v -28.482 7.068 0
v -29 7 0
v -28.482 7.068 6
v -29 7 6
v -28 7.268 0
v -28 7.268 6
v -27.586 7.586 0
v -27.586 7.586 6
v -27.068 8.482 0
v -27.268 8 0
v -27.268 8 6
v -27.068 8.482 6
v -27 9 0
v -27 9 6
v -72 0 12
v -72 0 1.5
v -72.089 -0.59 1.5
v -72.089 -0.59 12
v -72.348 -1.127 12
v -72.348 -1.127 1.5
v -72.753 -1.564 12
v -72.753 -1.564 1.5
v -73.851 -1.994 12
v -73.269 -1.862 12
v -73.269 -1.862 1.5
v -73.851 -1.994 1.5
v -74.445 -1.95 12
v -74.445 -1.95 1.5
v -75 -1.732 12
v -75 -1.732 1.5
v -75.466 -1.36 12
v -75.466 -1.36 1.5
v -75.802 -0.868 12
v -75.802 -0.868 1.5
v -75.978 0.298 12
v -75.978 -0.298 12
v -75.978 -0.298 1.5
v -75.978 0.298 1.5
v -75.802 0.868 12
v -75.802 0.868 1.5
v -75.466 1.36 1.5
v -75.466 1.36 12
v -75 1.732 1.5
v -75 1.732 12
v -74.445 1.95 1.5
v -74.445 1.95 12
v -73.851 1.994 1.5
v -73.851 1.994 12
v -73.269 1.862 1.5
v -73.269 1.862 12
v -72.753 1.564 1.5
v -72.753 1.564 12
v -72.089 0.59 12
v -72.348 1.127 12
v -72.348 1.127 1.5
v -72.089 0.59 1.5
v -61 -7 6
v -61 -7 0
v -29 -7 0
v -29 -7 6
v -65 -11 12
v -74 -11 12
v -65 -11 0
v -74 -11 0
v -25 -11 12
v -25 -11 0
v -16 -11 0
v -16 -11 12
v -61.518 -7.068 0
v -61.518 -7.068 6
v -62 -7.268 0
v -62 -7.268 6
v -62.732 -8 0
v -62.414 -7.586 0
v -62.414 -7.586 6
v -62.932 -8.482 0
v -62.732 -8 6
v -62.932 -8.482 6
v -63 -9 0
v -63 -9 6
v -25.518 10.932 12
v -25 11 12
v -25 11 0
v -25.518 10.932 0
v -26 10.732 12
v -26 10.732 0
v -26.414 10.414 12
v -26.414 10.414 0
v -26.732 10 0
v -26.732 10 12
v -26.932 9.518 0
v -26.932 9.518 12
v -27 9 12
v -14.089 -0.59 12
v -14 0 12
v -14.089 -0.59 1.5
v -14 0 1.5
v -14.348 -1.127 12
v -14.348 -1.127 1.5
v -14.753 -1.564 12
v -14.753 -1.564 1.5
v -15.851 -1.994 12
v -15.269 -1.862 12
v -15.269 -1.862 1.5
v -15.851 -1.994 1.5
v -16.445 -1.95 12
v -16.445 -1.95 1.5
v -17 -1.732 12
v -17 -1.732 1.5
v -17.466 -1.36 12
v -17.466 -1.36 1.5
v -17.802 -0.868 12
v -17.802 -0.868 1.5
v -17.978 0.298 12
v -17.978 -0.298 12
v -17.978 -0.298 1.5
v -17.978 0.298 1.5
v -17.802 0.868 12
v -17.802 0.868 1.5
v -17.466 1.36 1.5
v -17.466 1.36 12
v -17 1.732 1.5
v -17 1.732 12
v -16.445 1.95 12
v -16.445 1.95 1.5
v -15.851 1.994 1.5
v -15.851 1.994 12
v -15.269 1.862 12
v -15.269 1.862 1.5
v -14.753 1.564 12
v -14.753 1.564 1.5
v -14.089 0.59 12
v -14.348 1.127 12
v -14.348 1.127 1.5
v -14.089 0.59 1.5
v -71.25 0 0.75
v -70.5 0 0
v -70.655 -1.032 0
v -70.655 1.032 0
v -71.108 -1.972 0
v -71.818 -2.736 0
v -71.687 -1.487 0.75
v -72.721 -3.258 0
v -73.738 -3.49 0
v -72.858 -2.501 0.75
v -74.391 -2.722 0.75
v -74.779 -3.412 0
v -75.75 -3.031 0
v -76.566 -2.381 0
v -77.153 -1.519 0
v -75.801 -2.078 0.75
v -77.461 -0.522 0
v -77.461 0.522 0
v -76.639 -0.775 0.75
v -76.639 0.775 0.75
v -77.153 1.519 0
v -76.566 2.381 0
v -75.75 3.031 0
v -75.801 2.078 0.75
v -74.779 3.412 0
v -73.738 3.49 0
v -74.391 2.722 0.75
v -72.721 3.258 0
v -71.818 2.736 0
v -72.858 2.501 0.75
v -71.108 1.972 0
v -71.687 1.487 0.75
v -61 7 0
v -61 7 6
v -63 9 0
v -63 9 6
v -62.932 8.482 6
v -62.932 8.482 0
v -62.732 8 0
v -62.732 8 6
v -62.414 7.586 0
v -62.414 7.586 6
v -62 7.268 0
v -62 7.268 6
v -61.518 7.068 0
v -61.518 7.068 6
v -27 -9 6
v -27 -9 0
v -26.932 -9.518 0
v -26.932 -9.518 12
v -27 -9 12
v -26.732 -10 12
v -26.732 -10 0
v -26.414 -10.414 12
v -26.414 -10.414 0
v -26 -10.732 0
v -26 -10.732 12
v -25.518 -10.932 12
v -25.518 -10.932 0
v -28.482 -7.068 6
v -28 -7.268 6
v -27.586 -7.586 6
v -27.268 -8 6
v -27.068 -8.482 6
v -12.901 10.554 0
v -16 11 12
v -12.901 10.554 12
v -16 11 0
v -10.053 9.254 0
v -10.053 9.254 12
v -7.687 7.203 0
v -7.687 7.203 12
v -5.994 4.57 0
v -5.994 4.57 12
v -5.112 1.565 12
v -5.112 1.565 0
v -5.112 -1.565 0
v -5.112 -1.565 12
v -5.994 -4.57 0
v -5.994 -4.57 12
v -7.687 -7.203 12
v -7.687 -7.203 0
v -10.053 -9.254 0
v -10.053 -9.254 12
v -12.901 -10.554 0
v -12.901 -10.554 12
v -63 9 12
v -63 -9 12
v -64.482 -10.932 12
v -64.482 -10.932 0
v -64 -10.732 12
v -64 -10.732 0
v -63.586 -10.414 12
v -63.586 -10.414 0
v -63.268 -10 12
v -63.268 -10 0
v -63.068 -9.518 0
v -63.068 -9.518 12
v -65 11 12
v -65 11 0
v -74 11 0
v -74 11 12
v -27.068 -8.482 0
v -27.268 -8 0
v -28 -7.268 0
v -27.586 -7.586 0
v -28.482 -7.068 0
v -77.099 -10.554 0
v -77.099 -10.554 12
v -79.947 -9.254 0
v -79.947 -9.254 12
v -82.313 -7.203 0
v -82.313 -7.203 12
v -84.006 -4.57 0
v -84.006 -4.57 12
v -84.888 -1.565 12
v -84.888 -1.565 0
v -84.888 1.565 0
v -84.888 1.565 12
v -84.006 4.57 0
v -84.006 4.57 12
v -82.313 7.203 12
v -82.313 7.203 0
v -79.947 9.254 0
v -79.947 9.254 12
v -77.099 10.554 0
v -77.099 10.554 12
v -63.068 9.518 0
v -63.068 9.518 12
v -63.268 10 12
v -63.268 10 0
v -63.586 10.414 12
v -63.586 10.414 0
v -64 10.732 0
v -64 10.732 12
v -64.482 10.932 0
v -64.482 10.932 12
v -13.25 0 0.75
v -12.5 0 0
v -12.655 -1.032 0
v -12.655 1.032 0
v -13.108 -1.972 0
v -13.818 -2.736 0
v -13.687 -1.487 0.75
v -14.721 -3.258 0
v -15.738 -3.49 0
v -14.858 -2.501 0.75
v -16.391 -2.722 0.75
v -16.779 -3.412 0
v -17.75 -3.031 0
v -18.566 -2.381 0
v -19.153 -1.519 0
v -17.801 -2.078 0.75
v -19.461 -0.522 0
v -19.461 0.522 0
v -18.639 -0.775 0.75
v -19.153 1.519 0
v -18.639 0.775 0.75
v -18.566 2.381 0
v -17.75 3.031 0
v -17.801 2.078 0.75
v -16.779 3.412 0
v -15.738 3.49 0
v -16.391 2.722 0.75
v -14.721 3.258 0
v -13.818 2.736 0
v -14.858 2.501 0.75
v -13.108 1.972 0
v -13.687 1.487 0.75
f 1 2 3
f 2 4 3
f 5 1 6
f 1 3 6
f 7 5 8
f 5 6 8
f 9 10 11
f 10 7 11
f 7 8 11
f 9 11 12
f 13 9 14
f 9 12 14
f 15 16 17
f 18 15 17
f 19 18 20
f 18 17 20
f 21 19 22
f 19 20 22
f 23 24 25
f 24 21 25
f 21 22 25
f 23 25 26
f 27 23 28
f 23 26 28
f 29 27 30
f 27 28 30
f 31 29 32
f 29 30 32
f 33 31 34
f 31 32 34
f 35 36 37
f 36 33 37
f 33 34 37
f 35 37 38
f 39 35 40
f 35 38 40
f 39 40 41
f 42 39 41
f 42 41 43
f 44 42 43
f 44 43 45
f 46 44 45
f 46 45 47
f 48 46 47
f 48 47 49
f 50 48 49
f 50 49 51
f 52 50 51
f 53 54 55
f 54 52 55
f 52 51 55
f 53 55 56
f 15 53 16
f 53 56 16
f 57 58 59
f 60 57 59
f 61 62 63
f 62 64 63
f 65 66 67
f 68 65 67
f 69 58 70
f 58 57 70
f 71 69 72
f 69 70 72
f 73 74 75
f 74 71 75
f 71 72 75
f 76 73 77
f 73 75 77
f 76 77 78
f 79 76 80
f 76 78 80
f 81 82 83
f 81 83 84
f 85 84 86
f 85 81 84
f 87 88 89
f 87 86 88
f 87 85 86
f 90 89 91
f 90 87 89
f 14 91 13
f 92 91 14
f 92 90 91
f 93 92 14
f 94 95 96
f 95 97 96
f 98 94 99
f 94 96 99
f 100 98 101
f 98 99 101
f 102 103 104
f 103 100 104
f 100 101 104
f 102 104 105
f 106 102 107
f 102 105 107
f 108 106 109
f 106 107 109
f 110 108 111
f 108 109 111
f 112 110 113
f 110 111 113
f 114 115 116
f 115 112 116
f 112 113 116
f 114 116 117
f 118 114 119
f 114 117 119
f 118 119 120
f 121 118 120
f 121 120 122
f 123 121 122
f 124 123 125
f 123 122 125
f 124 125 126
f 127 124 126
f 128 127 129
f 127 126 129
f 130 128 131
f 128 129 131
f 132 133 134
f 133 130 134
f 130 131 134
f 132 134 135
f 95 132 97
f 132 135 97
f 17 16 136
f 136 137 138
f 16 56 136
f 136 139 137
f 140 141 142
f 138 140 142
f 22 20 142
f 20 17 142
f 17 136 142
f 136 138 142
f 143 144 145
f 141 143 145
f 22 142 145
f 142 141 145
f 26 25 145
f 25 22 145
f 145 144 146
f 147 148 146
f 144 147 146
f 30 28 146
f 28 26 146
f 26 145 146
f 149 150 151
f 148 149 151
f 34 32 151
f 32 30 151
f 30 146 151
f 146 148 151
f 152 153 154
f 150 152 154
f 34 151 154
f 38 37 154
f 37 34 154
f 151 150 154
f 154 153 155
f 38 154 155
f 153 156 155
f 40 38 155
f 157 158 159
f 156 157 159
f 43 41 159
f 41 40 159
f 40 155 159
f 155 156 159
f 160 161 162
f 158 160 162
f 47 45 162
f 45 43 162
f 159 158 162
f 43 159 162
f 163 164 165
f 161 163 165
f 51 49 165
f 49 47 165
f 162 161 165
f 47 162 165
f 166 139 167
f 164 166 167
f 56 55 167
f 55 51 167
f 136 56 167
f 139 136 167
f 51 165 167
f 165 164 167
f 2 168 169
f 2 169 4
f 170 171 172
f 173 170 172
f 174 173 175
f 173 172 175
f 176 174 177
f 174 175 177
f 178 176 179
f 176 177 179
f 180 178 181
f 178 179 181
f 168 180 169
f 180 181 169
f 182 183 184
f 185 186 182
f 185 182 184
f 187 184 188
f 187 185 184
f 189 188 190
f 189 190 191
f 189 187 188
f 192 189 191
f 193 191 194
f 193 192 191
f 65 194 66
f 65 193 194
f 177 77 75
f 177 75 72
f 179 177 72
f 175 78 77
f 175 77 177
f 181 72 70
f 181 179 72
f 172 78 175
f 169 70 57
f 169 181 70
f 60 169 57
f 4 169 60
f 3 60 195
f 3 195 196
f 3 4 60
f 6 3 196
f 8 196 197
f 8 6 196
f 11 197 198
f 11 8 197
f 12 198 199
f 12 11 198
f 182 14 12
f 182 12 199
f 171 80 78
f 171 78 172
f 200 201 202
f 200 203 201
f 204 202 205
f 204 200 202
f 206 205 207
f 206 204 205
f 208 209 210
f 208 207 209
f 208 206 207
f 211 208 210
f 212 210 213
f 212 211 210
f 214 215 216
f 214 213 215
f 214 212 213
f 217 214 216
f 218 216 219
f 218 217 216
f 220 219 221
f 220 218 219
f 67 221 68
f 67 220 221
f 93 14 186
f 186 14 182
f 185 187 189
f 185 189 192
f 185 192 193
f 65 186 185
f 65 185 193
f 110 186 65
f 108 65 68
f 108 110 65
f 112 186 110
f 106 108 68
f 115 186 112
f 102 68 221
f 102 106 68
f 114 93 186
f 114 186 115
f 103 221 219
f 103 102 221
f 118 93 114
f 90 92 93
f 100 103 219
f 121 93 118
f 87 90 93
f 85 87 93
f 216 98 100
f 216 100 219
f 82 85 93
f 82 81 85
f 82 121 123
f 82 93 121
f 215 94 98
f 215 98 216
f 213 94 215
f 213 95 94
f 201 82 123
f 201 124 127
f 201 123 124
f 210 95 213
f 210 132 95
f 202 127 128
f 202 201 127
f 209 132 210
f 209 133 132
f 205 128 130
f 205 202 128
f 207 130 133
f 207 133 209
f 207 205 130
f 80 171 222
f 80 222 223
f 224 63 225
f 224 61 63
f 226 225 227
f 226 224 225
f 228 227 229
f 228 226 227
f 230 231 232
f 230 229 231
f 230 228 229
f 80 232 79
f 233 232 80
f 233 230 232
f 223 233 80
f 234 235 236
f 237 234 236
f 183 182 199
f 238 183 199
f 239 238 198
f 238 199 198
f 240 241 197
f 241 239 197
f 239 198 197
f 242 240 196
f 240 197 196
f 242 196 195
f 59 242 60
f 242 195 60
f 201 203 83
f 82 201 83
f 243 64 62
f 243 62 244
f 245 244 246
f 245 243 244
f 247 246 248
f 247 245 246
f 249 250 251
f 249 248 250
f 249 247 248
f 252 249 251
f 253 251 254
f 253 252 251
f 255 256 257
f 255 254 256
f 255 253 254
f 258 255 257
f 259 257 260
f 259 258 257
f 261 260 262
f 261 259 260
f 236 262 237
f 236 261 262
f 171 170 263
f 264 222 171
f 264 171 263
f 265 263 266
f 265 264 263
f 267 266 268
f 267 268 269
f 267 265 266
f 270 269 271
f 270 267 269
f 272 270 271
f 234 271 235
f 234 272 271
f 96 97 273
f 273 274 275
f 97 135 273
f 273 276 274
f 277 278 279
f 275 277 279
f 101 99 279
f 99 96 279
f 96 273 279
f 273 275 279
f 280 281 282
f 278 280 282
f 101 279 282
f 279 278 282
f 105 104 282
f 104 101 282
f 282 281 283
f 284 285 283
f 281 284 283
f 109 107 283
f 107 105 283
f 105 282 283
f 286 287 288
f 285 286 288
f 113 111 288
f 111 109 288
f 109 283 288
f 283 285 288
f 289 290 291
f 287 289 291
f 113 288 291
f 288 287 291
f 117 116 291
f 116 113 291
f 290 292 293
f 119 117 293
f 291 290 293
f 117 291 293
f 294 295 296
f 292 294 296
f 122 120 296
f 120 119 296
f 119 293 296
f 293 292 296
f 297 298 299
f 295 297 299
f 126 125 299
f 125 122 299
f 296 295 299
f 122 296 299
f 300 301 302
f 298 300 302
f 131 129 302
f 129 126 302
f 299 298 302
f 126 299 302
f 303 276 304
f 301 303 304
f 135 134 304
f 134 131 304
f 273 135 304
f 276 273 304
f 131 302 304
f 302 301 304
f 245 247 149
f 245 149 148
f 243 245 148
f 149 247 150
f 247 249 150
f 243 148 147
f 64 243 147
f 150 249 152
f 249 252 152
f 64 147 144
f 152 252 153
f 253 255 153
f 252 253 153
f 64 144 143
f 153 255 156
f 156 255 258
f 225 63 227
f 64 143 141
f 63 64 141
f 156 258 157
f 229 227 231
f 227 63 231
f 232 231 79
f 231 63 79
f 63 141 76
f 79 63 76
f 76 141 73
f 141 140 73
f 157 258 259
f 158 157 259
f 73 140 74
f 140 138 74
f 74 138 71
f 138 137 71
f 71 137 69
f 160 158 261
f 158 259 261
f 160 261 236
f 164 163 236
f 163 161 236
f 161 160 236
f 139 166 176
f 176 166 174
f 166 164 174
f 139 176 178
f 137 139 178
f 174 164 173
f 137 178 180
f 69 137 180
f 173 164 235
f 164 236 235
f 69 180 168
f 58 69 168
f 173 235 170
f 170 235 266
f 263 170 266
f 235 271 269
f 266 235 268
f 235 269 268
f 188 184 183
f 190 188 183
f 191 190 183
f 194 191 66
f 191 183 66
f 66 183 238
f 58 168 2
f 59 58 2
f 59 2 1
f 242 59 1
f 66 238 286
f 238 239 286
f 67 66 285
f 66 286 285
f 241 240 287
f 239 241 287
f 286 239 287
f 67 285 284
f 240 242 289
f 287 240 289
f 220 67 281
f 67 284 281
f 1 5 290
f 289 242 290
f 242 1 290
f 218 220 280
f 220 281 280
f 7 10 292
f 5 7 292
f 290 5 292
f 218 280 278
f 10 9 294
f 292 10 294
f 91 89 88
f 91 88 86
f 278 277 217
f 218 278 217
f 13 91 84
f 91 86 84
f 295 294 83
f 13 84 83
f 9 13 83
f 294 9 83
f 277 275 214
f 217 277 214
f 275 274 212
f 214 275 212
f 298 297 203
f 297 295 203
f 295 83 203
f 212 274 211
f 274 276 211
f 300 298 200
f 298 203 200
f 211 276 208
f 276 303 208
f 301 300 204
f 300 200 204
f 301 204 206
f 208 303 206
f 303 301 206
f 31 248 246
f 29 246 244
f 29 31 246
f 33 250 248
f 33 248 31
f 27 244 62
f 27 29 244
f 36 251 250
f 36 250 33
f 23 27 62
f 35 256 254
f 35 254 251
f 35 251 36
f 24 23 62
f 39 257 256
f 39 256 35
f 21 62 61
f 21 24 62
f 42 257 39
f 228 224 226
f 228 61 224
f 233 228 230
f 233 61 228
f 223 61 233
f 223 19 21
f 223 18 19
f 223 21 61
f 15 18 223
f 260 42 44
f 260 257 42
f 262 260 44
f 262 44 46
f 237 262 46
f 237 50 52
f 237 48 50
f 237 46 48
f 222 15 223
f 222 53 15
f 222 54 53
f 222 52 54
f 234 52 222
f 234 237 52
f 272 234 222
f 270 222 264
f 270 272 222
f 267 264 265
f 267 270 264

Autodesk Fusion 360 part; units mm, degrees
sketch "Sketch1" plane through (0, 0, 0) normal (0, 0, 1) x (1, 0, 0)
  line L0 (-74, -11) -> (-16, -11)
  line L1 (-16, 11) -> (-74, 11)
  arc A0 (-74, 11) -> (-74, -11) centre (-74, 0) ccw
  arc A1 (-16, -11) -> (-16, 11) centre (-16, 0) ccw
  circle A2 centre (-74, 0) radius 2
  circle A3 centre (-16, 0) radius 2
  line L2 (-63, 11) -> (-63, -11)
  line L3 (-27, 11) -> (-27, -11)
  line L4 (-63, 7) -> (-27, 7)
  line L5 (-63, -7) -> (-27, -7)
  dimension "d1" = 4
  dimension "d2" = 4
extrude "Extrude1" add sketch "Sketch1" along normal blind 12 contours L0 L1 A0 L2 | L0 L1 A1 L3 makes body 1 at (-66, 0, 0) makes body 2 at (-24, 0, 0)
extrude "Extrude2" add sketch "Sketch1" along normal blind 6 contours L2 L3 L4 L5 bodies 1 2
chamfer "Chamfer1" distance 1.5 angle 45 2 edges at (-75.8647, 0.7232, 0) (-17.8647, 0.7232, 0) on bodies 1
fillet "Fillet1" radius 2 4 edges at (-63, -7, 3) (-27, -7, 3) (-27, 7, 3) (-63, 7, 3) on bodies 1
fillet "Fillet2" radius 2 4 edges at (-63, 11, 6) (-27, 11, 6) (-27, -11, 6) (-63, -11, 6) on bodies 1
